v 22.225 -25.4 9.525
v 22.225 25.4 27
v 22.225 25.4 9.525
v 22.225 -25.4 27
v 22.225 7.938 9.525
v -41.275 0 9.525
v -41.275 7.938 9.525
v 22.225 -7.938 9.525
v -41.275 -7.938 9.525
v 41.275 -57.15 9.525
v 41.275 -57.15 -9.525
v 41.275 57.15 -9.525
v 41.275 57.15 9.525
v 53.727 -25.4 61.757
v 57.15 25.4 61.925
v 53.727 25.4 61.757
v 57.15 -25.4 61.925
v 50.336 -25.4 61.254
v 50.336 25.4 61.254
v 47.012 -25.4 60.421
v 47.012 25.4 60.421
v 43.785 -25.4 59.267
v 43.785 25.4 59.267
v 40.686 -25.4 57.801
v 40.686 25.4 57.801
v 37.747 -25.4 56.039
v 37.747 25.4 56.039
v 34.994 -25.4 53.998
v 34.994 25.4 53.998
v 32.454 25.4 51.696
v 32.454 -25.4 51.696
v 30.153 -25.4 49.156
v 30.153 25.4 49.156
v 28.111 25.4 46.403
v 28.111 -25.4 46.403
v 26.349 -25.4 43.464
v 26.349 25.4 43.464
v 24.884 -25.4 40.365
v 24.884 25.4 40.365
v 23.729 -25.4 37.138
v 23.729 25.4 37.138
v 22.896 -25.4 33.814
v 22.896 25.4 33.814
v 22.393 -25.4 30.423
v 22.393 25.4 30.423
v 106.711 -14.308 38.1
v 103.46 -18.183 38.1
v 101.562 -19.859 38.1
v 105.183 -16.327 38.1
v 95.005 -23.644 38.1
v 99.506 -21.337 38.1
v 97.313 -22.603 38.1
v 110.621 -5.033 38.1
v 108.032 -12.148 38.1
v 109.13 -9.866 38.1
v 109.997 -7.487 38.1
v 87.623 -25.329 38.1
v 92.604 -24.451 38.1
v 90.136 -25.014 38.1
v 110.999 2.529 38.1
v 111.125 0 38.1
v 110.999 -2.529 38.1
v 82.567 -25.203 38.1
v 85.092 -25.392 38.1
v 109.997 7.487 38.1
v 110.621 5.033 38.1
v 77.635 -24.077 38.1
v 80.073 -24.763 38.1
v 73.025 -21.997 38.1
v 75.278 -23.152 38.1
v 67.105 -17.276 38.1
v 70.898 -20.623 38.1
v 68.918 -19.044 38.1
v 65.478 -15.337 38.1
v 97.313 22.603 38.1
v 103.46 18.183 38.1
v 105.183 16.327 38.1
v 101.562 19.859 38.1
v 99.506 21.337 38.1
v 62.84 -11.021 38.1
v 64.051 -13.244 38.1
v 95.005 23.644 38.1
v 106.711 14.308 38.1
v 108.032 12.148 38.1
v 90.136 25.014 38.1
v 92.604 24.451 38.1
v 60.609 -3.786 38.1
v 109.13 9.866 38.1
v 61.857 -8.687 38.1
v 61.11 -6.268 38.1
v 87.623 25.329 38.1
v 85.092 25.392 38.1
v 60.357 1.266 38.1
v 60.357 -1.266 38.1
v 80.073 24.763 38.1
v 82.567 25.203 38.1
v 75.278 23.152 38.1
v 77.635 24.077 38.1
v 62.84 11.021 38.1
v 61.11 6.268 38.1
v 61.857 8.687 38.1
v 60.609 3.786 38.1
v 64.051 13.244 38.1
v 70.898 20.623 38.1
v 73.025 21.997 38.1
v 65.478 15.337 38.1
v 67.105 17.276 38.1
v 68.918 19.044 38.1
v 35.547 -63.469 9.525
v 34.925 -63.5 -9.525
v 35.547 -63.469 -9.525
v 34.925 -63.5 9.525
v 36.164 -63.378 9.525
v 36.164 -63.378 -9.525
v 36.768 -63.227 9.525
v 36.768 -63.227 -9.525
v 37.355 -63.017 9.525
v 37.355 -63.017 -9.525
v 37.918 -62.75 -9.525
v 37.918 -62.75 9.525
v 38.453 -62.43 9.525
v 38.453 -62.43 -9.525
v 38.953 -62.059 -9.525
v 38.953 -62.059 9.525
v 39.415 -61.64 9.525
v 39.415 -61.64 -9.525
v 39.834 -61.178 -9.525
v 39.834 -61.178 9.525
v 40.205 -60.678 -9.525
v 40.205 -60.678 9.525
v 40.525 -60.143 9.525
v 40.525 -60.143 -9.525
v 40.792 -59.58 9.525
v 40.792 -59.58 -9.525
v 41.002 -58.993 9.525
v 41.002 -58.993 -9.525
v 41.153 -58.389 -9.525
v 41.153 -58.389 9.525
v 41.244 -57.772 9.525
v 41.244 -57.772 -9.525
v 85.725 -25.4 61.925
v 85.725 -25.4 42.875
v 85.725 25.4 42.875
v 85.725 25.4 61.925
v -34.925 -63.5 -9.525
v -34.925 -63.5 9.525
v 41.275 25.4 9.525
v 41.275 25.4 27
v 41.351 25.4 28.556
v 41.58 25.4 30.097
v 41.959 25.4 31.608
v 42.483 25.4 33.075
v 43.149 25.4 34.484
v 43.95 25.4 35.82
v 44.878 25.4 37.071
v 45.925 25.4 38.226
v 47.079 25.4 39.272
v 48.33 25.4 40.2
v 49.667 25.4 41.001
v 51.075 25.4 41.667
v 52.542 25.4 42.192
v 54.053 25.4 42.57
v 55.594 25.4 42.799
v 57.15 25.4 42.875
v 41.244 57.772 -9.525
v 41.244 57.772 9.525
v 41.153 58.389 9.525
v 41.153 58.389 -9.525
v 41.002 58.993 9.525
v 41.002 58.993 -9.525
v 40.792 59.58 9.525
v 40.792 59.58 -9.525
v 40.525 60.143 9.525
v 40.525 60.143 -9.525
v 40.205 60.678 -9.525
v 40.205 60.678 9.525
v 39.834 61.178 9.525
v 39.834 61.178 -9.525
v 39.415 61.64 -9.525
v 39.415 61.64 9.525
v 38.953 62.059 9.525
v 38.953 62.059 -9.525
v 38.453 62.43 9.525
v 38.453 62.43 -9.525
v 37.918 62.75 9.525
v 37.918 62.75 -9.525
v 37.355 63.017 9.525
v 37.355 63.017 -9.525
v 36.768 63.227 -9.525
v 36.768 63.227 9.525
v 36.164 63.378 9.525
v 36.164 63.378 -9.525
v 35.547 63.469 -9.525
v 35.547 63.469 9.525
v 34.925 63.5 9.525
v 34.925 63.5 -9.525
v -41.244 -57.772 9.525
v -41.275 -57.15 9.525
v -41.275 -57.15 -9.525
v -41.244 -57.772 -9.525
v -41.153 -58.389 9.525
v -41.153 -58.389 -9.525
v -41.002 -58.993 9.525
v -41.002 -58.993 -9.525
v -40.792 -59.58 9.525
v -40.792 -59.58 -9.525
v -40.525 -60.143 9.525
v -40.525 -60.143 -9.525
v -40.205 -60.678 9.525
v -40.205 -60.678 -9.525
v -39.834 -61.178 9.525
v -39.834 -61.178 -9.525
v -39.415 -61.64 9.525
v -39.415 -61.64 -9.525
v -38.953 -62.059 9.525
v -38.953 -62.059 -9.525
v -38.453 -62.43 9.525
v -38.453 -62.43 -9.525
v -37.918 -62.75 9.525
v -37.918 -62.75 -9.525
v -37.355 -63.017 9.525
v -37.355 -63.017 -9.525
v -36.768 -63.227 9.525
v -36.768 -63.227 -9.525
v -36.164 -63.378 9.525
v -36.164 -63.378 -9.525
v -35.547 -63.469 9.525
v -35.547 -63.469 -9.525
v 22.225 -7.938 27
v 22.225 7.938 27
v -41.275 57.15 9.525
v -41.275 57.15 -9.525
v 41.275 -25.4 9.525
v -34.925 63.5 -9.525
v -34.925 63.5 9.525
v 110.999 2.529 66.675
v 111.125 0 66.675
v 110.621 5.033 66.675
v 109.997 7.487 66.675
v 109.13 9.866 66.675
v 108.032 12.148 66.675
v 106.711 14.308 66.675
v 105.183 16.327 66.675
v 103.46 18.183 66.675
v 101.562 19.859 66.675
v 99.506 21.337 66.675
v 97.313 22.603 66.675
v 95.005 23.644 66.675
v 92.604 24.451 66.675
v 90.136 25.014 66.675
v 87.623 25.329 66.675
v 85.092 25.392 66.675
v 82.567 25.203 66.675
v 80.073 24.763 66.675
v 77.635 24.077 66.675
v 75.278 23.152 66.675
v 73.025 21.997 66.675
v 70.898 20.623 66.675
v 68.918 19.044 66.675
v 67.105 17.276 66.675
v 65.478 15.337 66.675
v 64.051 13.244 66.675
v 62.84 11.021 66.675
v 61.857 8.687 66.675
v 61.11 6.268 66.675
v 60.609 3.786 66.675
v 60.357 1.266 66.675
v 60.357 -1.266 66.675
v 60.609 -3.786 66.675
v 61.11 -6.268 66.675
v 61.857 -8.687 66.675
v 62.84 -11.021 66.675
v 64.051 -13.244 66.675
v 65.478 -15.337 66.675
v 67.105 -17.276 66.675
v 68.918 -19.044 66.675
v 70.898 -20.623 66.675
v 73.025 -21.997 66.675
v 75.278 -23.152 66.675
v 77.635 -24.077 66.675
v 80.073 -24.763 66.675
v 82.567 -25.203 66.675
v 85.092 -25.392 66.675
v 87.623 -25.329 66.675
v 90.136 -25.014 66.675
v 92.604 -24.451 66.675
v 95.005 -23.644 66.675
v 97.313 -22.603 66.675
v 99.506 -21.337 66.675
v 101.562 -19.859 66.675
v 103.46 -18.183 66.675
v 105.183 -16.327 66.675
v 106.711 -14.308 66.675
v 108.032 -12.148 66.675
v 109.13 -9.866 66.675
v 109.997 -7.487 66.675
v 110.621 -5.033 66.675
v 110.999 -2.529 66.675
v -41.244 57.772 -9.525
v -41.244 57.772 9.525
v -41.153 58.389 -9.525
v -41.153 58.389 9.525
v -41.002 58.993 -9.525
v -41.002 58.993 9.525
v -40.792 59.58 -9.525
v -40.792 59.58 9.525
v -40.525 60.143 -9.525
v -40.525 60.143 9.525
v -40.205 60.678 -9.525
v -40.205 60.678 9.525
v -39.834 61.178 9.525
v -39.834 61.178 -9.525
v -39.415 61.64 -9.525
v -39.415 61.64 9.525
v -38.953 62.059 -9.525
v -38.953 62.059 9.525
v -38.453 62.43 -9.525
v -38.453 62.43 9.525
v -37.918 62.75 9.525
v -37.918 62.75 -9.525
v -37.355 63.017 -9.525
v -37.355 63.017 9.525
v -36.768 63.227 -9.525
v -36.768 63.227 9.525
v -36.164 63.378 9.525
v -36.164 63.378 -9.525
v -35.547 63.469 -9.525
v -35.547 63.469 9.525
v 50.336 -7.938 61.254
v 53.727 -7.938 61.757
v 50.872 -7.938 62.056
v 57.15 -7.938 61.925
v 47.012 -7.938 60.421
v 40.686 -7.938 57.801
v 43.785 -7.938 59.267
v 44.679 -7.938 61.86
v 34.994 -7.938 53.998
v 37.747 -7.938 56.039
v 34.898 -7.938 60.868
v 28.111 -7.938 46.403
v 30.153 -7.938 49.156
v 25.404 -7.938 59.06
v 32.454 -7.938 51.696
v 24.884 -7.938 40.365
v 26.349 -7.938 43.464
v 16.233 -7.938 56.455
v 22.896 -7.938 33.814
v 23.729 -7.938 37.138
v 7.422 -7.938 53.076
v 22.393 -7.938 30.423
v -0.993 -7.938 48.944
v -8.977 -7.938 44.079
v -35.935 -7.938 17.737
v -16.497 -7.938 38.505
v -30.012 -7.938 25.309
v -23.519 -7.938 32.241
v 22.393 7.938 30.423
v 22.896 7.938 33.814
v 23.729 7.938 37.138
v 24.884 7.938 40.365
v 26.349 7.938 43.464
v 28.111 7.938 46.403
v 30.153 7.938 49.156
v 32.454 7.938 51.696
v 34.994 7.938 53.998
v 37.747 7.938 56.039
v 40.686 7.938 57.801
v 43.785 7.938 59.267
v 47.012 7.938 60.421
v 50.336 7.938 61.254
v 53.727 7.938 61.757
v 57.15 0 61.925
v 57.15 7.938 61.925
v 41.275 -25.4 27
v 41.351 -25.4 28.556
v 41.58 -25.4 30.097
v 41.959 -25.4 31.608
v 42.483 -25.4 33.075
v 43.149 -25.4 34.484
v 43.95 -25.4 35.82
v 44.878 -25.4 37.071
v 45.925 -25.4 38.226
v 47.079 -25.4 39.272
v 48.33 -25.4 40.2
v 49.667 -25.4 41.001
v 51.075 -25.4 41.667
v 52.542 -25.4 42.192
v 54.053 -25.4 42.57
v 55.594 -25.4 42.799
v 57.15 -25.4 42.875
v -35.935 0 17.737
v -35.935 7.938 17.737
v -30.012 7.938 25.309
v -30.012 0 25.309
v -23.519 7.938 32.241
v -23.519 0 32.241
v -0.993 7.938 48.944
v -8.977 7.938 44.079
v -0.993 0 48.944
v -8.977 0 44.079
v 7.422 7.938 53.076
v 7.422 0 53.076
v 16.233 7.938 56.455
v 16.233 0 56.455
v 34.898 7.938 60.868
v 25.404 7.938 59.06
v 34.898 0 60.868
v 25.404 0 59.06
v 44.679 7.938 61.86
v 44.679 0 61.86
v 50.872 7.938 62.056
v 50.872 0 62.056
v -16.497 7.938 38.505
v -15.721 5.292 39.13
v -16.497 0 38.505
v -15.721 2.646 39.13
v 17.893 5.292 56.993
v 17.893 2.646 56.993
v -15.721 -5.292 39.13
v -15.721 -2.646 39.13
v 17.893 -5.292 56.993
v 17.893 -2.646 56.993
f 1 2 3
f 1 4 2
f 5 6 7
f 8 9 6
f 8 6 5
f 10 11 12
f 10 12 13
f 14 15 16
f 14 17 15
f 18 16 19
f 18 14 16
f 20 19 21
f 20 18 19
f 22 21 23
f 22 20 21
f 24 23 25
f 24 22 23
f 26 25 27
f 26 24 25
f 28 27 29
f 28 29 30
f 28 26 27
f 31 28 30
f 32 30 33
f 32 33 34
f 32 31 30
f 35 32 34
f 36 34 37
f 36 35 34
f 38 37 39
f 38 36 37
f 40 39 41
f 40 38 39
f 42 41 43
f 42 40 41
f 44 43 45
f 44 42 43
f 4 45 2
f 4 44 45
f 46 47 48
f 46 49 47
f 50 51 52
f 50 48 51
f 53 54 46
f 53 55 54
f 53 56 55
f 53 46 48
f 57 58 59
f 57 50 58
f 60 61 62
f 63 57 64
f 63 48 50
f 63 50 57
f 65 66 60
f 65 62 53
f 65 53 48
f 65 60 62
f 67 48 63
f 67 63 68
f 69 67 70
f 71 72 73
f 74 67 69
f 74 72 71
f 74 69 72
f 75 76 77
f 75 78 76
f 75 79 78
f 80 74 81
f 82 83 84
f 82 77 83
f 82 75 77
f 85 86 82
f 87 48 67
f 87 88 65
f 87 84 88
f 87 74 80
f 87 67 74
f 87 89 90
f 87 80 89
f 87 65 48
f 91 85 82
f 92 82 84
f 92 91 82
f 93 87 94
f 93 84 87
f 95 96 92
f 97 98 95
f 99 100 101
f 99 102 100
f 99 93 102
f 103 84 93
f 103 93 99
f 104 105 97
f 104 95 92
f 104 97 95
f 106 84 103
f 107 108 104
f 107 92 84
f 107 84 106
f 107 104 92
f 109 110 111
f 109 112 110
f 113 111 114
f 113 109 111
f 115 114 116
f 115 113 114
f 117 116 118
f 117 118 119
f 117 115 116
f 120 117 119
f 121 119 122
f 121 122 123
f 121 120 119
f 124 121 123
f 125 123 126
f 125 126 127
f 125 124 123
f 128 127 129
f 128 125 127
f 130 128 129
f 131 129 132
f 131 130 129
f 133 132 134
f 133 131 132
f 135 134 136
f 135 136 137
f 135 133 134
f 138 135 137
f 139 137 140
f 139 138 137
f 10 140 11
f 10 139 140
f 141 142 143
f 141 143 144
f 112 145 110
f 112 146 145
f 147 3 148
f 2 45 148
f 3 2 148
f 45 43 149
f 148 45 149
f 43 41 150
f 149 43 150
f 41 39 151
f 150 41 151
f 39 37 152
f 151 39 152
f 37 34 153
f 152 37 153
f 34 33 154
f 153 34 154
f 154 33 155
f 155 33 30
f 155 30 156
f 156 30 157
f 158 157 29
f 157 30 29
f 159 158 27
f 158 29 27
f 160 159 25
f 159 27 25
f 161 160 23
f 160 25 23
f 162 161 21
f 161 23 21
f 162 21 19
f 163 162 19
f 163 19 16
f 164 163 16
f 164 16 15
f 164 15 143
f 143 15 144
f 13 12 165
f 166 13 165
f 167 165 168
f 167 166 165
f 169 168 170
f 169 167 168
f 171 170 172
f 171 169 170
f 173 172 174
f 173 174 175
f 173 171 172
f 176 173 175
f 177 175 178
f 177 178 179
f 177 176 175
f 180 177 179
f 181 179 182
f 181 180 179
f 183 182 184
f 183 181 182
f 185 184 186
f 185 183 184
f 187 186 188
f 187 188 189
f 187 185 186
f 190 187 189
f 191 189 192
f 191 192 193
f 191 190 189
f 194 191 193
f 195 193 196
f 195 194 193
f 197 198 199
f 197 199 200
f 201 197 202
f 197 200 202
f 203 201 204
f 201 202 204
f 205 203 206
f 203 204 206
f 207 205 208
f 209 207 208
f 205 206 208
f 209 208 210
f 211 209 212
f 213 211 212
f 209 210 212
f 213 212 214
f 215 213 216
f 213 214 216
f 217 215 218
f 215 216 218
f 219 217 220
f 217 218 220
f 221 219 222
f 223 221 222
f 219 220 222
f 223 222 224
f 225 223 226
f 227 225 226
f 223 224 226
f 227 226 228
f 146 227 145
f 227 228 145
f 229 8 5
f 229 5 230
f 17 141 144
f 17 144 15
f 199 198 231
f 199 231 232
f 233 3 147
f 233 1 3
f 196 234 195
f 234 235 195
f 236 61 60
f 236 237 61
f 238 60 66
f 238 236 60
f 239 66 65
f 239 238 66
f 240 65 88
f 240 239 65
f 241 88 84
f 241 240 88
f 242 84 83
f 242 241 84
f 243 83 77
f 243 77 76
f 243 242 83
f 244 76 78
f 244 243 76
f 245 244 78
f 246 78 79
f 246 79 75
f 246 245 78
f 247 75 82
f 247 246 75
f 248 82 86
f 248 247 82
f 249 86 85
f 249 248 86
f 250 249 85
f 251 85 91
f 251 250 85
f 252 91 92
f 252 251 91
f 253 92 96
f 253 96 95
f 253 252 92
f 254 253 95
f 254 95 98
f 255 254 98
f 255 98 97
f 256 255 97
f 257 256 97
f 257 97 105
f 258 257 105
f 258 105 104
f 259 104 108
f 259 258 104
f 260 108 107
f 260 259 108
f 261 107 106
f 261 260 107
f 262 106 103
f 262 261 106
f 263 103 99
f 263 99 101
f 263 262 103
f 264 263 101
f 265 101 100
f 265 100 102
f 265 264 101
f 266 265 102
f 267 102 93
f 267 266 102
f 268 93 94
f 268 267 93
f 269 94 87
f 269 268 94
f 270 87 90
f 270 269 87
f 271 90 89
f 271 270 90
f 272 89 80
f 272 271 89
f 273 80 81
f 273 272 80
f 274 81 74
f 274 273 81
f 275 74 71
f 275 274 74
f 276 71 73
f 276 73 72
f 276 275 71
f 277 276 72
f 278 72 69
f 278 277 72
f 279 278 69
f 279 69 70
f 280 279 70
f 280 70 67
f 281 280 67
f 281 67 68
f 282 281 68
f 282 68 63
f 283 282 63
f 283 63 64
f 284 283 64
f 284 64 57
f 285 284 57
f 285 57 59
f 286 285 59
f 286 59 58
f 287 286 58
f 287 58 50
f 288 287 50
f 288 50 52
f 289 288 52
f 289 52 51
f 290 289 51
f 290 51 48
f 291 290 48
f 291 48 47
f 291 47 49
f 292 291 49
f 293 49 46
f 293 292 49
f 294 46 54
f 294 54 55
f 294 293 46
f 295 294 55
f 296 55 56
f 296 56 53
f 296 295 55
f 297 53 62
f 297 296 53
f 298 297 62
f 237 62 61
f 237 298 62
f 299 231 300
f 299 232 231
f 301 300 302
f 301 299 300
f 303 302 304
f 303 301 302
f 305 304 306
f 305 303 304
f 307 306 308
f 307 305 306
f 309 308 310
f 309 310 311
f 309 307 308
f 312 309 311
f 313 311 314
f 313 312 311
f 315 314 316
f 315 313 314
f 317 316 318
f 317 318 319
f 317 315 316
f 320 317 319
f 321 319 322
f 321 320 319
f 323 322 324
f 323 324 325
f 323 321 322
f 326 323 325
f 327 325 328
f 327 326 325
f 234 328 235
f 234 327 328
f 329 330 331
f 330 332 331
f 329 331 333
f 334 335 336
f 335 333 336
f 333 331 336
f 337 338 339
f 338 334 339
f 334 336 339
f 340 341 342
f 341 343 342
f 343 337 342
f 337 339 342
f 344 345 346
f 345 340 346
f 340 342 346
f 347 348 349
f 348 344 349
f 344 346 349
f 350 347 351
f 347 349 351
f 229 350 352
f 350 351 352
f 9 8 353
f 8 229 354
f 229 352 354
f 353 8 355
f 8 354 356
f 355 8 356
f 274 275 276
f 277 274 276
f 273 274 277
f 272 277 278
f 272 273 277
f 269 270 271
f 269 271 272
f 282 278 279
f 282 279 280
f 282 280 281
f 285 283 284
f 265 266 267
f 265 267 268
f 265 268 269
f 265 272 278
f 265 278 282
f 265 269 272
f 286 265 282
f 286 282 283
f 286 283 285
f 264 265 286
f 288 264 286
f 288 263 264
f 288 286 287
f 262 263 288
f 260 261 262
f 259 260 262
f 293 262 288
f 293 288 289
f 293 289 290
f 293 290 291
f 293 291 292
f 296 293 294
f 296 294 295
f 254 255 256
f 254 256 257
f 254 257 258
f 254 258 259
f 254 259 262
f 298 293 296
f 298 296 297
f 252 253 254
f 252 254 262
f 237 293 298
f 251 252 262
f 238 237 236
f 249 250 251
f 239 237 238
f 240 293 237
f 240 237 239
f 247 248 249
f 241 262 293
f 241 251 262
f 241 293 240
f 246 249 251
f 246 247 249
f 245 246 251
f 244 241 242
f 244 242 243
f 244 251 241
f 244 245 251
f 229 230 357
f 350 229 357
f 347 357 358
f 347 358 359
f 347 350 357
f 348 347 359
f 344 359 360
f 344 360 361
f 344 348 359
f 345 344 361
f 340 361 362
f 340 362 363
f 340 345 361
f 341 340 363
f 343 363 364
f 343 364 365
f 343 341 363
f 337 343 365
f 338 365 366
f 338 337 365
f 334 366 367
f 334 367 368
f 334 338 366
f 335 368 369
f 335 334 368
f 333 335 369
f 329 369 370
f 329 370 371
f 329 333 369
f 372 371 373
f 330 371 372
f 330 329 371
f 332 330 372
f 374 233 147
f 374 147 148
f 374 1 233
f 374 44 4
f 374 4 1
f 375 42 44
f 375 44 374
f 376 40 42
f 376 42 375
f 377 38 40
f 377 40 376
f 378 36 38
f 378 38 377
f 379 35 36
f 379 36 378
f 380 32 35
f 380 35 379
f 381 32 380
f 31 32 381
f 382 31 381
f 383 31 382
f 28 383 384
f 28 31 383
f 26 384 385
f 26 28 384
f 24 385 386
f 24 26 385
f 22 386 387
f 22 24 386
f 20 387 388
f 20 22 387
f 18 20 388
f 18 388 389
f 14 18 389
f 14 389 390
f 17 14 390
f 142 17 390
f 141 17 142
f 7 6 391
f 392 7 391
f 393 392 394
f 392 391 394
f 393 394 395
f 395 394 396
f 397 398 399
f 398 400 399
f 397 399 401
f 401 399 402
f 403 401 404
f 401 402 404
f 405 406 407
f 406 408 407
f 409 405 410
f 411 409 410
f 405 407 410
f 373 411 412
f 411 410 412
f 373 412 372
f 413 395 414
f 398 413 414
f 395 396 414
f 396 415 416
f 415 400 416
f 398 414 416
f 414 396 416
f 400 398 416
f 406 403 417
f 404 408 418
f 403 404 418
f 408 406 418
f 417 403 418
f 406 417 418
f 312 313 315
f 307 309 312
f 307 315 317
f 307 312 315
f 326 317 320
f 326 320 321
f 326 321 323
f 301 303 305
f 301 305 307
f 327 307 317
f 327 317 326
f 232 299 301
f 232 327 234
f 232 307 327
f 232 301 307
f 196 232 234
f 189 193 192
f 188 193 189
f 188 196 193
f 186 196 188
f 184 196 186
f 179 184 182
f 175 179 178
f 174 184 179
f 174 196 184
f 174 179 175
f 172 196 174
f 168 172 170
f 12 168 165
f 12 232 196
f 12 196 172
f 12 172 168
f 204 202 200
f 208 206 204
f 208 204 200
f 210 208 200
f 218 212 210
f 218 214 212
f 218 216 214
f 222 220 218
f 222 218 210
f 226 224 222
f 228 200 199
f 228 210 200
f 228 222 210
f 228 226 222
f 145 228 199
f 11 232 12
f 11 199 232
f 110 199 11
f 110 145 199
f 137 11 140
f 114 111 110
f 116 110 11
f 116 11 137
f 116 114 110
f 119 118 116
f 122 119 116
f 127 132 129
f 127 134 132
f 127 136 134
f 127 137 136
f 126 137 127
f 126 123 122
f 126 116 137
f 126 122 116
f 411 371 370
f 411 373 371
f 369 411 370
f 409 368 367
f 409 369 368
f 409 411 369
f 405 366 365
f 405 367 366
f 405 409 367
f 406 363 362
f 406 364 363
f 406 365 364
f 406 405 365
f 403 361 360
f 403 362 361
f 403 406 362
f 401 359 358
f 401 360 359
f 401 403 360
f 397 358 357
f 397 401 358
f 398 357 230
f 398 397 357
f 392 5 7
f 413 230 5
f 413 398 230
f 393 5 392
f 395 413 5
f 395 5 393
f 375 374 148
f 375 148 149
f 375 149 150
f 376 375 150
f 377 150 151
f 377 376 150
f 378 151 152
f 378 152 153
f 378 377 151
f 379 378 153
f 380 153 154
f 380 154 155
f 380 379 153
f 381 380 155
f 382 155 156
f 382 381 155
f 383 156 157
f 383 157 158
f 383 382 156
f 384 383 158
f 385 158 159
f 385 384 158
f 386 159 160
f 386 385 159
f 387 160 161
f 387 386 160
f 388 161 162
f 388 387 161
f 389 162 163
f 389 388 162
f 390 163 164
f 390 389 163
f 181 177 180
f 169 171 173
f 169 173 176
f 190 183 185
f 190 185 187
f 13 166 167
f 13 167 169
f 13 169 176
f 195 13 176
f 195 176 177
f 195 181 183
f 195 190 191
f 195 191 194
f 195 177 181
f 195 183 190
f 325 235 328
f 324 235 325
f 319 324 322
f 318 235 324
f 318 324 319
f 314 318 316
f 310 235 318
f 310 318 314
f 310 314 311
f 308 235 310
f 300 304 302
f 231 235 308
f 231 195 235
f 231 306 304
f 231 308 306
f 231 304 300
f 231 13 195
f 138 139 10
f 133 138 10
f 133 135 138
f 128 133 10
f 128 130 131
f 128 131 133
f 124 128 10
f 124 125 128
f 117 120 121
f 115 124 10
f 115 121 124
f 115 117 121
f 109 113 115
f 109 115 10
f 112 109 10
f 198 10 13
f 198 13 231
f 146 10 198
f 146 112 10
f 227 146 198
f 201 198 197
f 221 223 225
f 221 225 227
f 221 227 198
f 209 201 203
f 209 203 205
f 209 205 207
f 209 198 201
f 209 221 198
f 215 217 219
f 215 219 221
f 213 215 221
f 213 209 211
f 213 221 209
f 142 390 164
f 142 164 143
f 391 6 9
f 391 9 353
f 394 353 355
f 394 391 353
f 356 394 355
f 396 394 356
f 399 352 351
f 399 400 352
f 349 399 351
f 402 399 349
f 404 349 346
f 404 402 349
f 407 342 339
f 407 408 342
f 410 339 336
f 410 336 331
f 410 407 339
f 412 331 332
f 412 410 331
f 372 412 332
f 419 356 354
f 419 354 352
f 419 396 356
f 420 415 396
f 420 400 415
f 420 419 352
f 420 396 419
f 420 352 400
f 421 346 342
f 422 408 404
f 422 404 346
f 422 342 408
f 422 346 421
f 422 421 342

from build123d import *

# Parameters (mm, degrees)
F1_DEPTH = 63.5
F0_W     = 25.4
F0_H     = 19.05
F2_DEPTH = 25.4
F3_DEPTH = 7.9375
F5_R     = 6.35


# Not quite as in the source:
# - a feature names something its author has since deleted; it is built from what else it names


with BuildPart() as f1:
    # F0 (on Front) → F1 (new body, symmetric)
    with BuildSketch(Plane.XZ):
        Polygon((-41.275, -9.525), (41.275, -9.525), (41.275, 9.525), (22.225, 9.525), (-41.275, 9.525), align=None)
    extrude(amount=F1_DEPTH, both=True)

    # F5
    f5_edges = [f1.edges().sort_by_distance(p)[0] for p in [
        (41.275, -63.5, 0),
        (-41.275, -63.5, 0),
        (41.275, 63.5, 0),
        (-41.275, 63.5, 0),
    ]]
    fillet(f5_edges, radius=F5_R)


with BuildPart() as f2:
    # F0 (on Front) → F2 (new body, symmetric)
    with BuildSketch(Plane.XZ):
        with BuildLine():
            Line((22.225, 9.525), (41.275, 9.525))
            Line((41.275, 9.525), (41.275, 27.0002))
            ThreePointArc((41.275, 27.0002), (45.9246798487, 38.2255201513), (57.15, 42.8752))
            Line((57.15, 42.8752), (60.325, 42.8752))
            Line((60.325, 42.8752), (60.325, 61.9252))
            Line((60.325, 61.9252), (57.15, 61.9252))
            ThreePointArc((57.15, 61.9252), (32.4542956671, 51.6959043329), (22.225, 27.0002))
            Line((22.225, 27.0002), (22.225, 9.525))
        make_face()
        with Locations((73.025, 52.4002)):
            Rectangle(F0_W, F0_H)
    extrude(amount=F2_DEPTH, both=True)


with BuildPart() as f3:
    # F0 (on Front) → F3 (new body, symmetric)
    with BuildSketch(Plane.XZ):
        with BuildLine():
            add(Edge.make_bspline(
                [(-41.275, 9.525), (-20.5563157797, 44.6057990193), (15.8763434738, 63.8532415032), (57.15, 61.9252)],
                knots=[0, 0, 0, 0, 111.5045361635, 111.5045361635, 111.5045361635, 111.5045361635], degree=3))
            Line((-41.275, 9.525), (22.225, 9.525))
            Line((22.225, 9.525), (22.225, 27.0002))
            ThreePointArc((22.225, 27.0002), (32.4542956671, 51.6959043329), (57.15, 61.9252))
        make_face()
    extrude(amount=F3_DEPTH, both=True)


with BuildPart() as f4:
    # F0 (on Front) → F4 (revolve)
    with BuildSketch(Plane.XZ):
        Polygon((85.725, 66.675), (85.725, 61.9252), (85.725, 42.8752), (85.725, 38.1), (111.125, 38.1), (111.125, 66.675), align=None)
    revolve(axis=Axis((85.725, 0, 52.3875), (0, 0, 1)))


solid = Compound([f1.part, f2.part, f3.part, f4.part])
